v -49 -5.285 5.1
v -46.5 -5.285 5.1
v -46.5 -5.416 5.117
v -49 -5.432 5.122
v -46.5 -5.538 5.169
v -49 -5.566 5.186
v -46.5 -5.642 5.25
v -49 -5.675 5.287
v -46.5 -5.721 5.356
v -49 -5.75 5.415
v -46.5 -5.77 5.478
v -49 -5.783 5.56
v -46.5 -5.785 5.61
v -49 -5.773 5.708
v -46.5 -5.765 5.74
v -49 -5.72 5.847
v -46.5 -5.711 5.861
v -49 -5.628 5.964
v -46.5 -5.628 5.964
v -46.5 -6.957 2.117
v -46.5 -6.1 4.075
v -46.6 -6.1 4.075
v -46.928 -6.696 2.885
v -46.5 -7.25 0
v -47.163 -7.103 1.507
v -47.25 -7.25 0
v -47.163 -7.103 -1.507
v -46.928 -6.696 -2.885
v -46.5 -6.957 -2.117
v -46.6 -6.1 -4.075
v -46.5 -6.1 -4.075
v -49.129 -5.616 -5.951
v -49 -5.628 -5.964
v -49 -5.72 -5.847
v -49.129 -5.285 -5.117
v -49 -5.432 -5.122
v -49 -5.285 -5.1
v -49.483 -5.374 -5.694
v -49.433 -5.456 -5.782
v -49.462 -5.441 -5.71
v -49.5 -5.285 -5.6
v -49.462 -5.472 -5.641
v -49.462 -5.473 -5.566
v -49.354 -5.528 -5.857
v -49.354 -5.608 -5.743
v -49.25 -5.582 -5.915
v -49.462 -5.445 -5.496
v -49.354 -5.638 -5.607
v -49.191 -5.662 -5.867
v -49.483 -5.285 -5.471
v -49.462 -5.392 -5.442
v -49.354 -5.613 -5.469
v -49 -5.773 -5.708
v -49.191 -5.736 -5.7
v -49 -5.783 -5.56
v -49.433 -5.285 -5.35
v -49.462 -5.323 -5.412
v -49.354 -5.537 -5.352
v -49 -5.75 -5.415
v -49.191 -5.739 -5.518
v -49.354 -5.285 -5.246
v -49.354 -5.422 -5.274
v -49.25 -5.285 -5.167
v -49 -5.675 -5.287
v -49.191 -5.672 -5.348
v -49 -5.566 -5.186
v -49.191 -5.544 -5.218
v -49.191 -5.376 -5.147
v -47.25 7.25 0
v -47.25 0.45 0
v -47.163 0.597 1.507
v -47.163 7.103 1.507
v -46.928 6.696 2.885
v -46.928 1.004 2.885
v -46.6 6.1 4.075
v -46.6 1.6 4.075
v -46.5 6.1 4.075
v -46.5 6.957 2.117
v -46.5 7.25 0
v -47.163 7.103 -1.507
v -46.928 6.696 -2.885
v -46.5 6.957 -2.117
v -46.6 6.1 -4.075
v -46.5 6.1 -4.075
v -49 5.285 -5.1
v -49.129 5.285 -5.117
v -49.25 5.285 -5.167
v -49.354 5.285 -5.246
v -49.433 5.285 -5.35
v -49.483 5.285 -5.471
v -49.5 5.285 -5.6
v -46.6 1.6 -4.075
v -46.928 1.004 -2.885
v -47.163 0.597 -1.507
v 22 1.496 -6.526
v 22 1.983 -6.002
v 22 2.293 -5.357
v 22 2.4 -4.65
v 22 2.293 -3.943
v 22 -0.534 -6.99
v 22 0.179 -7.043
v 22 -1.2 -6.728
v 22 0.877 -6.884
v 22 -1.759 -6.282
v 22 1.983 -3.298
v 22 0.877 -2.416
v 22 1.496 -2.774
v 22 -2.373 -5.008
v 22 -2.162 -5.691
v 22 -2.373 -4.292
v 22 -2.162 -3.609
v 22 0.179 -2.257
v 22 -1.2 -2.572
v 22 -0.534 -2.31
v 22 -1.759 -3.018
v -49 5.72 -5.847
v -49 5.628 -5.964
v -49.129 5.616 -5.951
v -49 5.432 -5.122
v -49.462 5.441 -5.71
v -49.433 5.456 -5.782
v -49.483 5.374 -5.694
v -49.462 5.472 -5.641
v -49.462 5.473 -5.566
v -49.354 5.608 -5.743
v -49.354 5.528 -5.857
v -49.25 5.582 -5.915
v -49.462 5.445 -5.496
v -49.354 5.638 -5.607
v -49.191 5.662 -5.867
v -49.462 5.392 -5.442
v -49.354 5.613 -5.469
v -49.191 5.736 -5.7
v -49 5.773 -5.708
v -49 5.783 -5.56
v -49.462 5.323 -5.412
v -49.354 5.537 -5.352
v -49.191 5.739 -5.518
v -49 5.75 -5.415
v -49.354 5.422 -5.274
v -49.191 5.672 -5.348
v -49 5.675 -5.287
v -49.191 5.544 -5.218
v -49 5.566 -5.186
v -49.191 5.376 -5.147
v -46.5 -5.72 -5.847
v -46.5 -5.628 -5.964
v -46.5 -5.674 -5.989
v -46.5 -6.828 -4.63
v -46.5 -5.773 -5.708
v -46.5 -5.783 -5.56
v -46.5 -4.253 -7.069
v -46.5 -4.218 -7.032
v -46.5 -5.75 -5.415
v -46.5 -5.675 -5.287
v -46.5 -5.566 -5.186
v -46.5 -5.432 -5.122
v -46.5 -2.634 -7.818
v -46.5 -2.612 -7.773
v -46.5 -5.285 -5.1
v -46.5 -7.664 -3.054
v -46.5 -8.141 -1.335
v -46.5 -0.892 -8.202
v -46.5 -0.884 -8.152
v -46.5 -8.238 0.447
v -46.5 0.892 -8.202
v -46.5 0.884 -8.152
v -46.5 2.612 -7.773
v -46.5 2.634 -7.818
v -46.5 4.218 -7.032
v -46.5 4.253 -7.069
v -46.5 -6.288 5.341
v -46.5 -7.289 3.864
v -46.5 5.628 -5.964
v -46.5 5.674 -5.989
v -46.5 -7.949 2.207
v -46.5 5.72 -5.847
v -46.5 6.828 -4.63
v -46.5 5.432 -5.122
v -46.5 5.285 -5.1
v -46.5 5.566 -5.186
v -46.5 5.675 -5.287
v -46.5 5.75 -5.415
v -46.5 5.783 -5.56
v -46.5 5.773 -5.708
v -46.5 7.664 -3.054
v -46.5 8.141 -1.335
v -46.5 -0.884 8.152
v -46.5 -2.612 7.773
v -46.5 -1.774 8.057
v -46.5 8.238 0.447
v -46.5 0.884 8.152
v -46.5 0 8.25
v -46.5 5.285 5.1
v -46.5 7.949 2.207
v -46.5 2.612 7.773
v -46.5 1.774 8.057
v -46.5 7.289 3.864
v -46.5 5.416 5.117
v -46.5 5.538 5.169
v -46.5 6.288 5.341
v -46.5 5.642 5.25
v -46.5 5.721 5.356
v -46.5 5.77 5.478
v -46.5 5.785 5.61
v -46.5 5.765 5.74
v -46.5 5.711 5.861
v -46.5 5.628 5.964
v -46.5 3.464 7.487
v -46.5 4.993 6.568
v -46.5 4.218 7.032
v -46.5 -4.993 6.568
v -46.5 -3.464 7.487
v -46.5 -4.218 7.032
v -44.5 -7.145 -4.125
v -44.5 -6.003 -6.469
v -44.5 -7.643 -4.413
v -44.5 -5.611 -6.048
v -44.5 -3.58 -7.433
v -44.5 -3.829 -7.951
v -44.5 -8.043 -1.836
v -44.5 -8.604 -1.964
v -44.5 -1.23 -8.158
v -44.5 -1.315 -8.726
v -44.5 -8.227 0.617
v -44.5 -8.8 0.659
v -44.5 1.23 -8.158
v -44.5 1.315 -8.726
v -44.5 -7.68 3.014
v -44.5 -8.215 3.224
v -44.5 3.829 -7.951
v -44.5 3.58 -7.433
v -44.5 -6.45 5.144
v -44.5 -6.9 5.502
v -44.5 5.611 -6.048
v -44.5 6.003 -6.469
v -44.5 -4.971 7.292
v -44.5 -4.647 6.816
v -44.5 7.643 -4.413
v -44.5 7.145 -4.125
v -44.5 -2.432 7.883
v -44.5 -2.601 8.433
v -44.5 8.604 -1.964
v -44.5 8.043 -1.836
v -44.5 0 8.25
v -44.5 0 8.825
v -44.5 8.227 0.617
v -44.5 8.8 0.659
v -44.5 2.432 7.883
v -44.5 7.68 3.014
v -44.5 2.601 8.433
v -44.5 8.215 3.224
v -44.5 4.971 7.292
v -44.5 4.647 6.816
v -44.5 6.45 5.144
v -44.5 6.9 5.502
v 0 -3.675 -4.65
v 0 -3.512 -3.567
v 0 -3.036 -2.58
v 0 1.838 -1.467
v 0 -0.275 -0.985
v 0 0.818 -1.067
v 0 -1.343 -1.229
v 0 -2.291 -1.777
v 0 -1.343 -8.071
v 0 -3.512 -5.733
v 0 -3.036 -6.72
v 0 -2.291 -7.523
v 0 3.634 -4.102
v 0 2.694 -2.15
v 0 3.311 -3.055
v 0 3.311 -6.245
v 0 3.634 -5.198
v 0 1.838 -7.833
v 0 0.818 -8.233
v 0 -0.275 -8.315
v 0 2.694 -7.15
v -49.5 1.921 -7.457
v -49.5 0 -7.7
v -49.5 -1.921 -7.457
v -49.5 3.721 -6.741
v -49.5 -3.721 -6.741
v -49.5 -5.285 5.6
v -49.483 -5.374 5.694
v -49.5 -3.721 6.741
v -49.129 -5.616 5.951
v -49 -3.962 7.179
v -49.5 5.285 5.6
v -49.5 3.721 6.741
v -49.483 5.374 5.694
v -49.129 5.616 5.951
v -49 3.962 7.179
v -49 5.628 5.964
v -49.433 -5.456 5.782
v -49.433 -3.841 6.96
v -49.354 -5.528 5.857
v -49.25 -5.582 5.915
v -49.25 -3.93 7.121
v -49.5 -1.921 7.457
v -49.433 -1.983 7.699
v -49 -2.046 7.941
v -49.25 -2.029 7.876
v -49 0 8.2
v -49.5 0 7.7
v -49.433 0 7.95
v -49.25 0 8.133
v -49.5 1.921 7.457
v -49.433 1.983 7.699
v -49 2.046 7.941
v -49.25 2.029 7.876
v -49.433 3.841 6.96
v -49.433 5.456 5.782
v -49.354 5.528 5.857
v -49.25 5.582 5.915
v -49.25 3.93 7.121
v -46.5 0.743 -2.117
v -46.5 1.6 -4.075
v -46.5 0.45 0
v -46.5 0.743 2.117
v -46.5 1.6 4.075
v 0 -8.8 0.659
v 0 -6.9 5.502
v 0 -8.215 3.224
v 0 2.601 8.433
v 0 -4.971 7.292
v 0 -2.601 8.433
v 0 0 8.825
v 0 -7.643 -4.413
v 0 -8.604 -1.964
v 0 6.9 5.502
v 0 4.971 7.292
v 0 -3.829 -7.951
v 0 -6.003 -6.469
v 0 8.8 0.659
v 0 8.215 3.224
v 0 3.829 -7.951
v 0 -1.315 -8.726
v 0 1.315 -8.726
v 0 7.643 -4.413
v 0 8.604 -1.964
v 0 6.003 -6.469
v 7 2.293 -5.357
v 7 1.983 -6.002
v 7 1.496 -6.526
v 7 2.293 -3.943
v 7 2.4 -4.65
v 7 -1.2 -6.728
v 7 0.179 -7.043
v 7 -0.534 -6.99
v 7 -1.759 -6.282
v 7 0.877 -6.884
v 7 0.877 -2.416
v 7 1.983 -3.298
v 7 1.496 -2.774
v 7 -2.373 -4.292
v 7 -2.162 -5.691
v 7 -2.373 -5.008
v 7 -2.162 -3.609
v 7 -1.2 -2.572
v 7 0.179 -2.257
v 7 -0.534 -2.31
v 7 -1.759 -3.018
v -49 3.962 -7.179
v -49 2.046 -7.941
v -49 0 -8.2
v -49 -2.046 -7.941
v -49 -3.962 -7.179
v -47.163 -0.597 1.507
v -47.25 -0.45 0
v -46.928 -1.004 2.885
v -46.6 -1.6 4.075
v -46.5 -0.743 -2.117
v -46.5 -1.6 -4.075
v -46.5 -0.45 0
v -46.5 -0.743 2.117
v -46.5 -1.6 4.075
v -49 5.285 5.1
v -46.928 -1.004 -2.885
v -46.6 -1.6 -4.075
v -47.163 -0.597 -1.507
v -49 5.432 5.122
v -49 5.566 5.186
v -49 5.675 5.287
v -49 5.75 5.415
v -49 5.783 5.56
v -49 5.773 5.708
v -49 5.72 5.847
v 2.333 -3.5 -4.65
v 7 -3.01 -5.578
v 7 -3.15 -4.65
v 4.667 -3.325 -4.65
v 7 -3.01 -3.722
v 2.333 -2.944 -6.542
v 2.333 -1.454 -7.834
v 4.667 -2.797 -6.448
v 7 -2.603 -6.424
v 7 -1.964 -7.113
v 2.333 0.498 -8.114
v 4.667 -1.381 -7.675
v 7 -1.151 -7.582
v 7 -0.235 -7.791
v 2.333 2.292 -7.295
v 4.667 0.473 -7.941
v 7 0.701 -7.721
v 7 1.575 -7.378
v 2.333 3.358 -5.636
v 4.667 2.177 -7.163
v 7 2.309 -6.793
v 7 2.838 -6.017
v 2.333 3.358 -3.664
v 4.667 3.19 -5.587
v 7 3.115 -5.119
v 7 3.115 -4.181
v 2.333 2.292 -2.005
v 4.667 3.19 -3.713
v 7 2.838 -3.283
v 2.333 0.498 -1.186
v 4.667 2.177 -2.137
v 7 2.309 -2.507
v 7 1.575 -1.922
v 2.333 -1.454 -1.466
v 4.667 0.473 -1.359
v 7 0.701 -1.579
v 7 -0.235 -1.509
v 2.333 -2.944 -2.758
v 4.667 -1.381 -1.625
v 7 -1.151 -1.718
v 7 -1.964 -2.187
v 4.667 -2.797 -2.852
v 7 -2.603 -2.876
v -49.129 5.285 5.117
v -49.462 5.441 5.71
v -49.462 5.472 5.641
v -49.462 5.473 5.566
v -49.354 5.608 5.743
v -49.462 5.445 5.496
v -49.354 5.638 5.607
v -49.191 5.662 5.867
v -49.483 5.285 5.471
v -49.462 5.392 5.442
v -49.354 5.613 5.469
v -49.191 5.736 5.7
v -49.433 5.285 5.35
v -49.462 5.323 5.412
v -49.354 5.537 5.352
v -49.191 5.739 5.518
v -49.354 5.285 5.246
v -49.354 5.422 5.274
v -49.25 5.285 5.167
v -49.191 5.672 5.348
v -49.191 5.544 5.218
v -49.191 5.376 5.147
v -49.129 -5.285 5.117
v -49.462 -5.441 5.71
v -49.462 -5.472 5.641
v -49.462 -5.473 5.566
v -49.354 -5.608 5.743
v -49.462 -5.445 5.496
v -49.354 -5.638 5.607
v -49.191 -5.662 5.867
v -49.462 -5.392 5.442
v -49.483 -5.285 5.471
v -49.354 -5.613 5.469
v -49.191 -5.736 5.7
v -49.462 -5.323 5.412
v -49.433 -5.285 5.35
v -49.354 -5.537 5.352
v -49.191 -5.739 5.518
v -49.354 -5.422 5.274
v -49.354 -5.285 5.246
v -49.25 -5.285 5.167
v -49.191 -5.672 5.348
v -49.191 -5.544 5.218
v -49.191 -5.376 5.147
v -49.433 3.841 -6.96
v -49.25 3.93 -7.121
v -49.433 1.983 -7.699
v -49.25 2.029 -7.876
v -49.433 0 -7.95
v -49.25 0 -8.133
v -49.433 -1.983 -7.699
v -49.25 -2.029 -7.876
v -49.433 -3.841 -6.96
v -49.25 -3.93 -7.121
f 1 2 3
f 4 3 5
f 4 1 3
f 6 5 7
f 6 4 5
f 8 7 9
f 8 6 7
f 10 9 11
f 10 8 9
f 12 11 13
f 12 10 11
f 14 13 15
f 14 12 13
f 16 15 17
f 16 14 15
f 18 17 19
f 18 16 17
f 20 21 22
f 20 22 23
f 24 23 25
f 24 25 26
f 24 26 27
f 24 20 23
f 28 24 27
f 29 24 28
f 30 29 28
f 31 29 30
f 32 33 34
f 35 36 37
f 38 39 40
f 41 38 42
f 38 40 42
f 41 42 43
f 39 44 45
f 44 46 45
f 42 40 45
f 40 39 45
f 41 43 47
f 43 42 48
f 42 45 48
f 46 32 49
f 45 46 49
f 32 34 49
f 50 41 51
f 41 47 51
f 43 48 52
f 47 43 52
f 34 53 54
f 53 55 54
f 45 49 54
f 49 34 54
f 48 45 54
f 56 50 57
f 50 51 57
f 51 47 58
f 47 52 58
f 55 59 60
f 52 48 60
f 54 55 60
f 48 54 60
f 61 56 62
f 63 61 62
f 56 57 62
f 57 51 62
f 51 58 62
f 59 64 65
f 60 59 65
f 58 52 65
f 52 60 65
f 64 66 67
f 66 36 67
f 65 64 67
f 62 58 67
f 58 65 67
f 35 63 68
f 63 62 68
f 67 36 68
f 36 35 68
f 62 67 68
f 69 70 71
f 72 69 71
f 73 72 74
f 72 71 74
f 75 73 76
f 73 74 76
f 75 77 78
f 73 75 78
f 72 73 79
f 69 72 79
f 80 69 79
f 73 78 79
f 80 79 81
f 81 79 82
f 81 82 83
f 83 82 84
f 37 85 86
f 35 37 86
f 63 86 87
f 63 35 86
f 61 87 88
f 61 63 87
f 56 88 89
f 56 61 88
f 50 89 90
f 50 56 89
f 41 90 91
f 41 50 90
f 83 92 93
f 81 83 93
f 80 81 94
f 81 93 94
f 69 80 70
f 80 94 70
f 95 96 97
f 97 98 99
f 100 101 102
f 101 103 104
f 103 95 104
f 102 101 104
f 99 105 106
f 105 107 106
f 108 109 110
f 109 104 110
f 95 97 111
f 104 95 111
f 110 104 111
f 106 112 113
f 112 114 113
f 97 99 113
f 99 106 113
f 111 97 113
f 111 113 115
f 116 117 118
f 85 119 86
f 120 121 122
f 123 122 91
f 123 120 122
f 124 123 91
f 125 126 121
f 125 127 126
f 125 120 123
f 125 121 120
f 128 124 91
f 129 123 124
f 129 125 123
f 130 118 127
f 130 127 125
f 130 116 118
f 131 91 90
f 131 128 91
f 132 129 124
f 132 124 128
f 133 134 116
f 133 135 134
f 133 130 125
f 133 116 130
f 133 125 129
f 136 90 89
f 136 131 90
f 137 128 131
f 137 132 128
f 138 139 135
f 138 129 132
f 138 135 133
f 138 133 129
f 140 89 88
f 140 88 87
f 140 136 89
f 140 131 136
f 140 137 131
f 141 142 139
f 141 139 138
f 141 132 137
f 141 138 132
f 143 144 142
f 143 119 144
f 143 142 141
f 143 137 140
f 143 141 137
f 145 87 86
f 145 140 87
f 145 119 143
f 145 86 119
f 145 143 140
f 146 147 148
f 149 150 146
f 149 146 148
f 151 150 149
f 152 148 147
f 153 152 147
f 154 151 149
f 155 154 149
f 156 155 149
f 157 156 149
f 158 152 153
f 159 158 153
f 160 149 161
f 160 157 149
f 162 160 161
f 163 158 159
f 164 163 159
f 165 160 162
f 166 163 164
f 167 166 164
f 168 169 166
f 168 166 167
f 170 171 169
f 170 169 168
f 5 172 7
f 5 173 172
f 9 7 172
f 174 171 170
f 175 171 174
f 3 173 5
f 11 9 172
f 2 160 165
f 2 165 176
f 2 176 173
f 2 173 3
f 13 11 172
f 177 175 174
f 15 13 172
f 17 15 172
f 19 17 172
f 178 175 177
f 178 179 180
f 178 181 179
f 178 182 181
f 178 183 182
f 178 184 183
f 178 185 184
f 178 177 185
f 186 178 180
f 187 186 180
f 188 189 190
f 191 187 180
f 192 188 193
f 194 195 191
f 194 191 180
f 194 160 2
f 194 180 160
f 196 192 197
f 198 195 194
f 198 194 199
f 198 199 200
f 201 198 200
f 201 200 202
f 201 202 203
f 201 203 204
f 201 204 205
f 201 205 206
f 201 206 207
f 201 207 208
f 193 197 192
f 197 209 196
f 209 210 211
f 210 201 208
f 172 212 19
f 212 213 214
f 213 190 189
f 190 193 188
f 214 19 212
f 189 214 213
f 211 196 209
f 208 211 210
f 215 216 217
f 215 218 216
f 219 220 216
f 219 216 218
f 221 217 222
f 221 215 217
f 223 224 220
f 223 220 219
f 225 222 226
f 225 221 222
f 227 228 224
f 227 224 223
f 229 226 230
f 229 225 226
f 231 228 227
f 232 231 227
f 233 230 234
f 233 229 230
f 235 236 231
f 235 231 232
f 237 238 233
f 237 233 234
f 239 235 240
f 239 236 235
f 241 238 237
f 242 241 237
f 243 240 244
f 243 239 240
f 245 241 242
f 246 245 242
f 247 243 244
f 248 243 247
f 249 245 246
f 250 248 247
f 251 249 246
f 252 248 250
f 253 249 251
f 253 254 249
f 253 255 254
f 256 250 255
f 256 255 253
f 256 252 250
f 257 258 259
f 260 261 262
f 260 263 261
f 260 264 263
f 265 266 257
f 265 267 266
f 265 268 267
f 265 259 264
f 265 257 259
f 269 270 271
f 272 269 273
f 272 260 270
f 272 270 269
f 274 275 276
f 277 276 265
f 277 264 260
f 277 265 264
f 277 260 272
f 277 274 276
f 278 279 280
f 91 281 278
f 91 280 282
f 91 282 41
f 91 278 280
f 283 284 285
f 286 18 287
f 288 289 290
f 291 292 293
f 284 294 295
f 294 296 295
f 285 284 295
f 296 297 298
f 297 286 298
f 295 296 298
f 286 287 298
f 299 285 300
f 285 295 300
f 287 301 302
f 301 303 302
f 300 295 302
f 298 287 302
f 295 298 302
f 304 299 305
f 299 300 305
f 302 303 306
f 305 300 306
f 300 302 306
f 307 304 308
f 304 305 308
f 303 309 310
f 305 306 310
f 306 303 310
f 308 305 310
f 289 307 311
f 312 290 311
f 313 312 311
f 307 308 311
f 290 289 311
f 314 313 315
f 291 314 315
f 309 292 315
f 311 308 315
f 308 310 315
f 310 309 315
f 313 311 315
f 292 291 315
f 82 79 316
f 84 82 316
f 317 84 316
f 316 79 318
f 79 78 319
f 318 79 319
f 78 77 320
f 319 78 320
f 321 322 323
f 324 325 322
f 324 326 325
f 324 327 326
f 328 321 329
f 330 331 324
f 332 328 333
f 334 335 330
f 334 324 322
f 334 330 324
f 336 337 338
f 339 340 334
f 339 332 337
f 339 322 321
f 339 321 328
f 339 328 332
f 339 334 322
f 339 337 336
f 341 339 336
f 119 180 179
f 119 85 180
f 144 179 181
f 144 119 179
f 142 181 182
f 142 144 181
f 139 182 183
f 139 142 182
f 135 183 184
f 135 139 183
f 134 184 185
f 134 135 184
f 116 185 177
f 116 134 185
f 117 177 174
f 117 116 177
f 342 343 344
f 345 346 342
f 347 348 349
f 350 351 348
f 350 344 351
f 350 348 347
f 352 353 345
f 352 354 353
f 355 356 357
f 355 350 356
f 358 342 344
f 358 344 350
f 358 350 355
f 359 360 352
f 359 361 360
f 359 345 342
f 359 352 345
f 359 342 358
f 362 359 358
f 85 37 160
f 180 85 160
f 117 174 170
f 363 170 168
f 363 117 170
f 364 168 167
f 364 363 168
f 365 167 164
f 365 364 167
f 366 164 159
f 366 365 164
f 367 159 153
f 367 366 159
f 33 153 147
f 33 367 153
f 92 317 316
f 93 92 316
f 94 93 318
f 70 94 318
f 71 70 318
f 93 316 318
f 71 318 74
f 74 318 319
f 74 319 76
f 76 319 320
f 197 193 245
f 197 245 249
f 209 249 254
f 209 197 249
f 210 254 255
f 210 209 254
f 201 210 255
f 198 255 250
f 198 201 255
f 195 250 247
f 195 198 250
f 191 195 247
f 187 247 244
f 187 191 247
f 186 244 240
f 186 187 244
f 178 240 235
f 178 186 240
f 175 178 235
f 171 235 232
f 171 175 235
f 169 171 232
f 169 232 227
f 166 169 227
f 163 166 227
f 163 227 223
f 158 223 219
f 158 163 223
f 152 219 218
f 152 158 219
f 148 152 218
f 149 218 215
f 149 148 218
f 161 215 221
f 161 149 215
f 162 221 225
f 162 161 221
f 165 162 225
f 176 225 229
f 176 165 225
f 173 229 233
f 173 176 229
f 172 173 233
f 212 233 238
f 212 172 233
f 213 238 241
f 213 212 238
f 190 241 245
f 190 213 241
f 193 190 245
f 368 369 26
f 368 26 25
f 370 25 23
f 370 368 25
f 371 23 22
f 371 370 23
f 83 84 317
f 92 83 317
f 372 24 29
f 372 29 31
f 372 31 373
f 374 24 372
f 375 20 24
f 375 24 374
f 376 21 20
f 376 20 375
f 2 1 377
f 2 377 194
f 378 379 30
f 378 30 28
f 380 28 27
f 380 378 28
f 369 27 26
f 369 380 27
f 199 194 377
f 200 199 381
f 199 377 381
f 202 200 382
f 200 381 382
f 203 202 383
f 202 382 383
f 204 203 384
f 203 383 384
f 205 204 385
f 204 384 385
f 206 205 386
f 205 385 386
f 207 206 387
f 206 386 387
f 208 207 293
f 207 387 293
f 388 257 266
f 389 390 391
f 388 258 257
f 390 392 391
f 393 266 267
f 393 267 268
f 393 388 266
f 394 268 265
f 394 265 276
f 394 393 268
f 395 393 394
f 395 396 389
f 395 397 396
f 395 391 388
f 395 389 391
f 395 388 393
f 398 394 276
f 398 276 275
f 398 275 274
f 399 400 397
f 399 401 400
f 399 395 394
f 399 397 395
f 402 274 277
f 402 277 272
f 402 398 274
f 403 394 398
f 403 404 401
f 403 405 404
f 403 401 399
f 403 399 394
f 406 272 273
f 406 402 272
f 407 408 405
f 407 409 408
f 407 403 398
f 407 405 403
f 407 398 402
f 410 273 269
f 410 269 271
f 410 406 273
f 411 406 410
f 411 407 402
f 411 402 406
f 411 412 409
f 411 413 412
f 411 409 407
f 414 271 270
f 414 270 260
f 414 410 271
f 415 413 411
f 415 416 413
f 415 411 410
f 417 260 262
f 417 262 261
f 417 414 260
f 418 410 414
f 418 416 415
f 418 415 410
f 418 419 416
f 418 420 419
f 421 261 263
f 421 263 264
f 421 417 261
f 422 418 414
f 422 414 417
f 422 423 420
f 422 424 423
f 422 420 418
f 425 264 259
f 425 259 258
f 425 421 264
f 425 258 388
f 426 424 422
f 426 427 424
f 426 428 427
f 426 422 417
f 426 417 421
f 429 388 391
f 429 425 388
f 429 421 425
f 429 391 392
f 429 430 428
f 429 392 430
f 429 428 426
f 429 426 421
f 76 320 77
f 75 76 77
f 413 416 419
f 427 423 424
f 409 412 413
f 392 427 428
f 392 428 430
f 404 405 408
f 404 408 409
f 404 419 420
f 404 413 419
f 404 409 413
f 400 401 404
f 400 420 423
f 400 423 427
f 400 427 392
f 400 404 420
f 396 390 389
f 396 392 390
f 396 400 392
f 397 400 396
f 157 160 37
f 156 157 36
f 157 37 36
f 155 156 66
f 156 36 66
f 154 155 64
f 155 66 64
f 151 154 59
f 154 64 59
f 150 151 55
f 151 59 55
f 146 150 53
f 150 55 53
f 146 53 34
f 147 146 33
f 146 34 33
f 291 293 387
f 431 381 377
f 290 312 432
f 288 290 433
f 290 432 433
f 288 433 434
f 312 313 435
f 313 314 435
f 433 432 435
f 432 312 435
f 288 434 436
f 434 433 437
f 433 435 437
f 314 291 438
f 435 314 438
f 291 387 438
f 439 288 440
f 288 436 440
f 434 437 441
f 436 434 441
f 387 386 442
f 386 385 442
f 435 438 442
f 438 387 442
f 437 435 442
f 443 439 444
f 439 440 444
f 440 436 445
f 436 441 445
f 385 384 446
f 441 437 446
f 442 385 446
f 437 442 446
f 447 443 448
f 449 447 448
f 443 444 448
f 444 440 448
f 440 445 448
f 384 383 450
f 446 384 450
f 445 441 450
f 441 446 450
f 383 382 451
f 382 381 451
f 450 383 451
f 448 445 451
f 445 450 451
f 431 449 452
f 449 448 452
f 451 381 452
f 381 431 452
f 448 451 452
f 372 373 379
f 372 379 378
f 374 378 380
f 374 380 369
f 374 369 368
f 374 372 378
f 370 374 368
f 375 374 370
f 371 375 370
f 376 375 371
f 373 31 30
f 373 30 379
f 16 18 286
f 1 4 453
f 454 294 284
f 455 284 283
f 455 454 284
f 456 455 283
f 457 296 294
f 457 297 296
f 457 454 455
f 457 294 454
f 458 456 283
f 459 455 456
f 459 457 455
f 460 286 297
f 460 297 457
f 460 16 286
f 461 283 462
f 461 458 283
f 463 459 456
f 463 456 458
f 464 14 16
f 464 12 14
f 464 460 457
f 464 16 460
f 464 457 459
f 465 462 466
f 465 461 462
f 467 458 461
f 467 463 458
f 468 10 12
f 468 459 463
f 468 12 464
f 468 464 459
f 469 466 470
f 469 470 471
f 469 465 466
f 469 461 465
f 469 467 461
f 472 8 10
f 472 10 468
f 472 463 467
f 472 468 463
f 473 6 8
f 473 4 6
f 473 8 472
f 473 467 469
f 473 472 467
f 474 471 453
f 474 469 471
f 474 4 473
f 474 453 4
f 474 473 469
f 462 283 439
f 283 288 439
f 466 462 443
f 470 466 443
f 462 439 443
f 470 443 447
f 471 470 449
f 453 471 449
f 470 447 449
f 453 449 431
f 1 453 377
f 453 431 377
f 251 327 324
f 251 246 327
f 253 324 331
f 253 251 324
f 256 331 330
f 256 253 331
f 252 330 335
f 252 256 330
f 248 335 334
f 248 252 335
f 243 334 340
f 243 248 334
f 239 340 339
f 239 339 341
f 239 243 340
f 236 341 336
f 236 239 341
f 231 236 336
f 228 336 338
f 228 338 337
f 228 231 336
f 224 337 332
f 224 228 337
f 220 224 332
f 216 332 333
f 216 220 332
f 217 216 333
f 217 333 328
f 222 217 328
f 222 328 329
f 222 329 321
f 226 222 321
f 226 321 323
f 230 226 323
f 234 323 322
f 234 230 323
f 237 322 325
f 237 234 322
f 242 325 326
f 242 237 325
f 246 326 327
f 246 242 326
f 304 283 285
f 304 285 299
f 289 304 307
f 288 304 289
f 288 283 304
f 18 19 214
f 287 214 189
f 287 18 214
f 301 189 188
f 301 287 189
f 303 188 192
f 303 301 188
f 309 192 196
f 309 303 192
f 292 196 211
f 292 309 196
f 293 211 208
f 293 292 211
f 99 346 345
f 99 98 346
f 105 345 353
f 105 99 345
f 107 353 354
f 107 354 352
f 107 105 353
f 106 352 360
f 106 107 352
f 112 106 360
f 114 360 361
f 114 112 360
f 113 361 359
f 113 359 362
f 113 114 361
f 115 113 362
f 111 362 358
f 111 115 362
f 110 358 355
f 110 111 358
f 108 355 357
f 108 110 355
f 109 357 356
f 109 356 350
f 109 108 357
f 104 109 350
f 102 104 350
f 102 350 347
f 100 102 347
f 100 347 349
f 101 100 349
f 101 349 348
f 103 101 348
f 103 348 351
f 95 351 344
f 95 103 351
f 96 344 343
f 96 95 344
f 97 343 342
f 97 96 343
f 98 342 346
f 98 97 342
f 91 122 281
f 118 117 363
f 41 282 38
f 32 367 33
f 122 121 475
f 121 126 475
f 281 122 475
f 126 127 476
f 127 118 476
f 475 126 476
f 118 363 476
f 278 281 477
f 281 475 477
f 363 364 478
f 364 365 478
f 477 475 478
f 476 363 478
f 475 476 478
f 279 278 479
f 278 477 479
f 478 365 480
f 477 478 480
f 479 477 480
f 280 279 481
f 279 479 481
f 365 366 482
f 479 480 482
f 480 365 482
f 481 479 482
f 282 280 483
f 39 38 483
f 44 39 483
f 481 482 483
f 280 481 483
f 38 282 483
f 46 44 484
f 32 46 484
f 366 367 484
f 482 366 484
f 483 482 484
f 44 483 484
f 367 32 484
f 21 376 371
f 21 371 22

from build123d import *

# Parameters (mm, degrees)
F2_W      = 3
F2_H      = 10.2
F3_DEPTH  = 12.5
F4_R      = 0.5
F8_W      = 15
F8_H      = 2.4
F11_DEPTH = 0.75
F13_DEPTH = 8.826


with BuildPart() as f1:
    # F0 (on Front) → F1 (revolve)
    with BuildSketch(Plane.XZ):
        Polygon((-49.5, 8.2), (-49.5, 0), (0, 0), (0, 8.825), (-44.5, 8.825), (-44.5, 8.25), (-46.5, 8.25), (-46.5, 8.2), align=None)
    revolve(axis=Axis((-24.75, 0, 0), (-1, 0, 0)))

    # F2 (on Front) → F3 (cut, symmetric)
    with BuildSketch(Plane.XZ):
        with Locations((-48, 0)):
            Rectangle(F2_W, F2_H)
    extrude(amount=F3_DEPTH, both=True, mode=Mode.SUBTRACT)

    # F4
    f4_edges = [f1.edges().sort_by_distance(p)[0] for p in [
        (-49.5, 0, 5.1),
        (-48, 6.421059, 5.1),
        (-48, -6.421059, 5.1),
        (-49.5, 0, 8.2),
        (-48, 6.421059, -5.1),
        (-48, -6.421059, -5.1),
        (-49.5, 0, -8.2),
        (-49.5, 0, -5.1),
    ]]
    fillet(f4_edges, radius=F4_R)


with BuildPart() as f7:
    # F6 (on offset) → F7 (revolve)
    with BuildSketch(Plane.XY.offset(-4.65)):
        Polygon((0, 0), (0, -3.675), (7, -3.15), (7, 0), align=None)
    revolve(axis=Axis((3.5, 0, -4.65), (1, 0, 0)))


with BuildPart() as f9:
    # F8 (on offset) → F9 (revolve)
    with BuildSketch(Plane.XY.offset(-4.65)):
        with Locations((14.5, 1.2)):
            Rectangle(F8_W, F8_H)
    revolve(axis=Axis((14.5, 0, -4.65), (1, 0, 0)))


with BuildPart() as f11:
    # F10 (on face) → F11 (new body)
    with BuildSketch(Plane(origin=(-46.5, 0, 0), x_dir=(0, -1, 0), z_dir=(-1, 0, 0))):
        with BuildLine():
            Line((-1.6, 4.075), (-6.1, 4.075))
            ThreePointArc((-6.1, 4.075), (-7.25, 0), (-6.1, -4.075))
            Line((-6.1, -4.075), (-1.6, -4.075))
            ThreePointArc((-1.6, -4.075), (-0.45, 0), (-1.6, 4.075))
        make_face()
    extrude(amount=F11_DEPTH)

    # F12 (on Front) → F13 (cut, through all)
    with BuildSketch(Plane.XZ):
        with BuildLine():
            ThreePointArc((-46.6, -4.075), (-47.0864793145, -2.0632574367), (-47.25, 0))
            Line((-47.25, 0), (-47.25, -4.075))
            Line((-47.25, -4.075), (-46.6, -4.075))
        make_face()
        with BuildLine():
            ThreePointArc((-47.25, 0), (-47.0864793145, 2.0632574367), (-46.6, 4.075))
            Line((-46.6, 4.075), (-47.25, 4.075))
            Line((-47.25, 4.075), (-47.25, 0))
        make_face()
    extrude(amount=-F13_DEPTH, mode=Mode.SUBTRACT)


with BuildPart() as f14_1:
    # F14: instance of F11
    add(f11.part.mirror(Plane.XZ))


solid = Compound([f1.part, f7.part, f9.part, f11.part, f14_1.part])
